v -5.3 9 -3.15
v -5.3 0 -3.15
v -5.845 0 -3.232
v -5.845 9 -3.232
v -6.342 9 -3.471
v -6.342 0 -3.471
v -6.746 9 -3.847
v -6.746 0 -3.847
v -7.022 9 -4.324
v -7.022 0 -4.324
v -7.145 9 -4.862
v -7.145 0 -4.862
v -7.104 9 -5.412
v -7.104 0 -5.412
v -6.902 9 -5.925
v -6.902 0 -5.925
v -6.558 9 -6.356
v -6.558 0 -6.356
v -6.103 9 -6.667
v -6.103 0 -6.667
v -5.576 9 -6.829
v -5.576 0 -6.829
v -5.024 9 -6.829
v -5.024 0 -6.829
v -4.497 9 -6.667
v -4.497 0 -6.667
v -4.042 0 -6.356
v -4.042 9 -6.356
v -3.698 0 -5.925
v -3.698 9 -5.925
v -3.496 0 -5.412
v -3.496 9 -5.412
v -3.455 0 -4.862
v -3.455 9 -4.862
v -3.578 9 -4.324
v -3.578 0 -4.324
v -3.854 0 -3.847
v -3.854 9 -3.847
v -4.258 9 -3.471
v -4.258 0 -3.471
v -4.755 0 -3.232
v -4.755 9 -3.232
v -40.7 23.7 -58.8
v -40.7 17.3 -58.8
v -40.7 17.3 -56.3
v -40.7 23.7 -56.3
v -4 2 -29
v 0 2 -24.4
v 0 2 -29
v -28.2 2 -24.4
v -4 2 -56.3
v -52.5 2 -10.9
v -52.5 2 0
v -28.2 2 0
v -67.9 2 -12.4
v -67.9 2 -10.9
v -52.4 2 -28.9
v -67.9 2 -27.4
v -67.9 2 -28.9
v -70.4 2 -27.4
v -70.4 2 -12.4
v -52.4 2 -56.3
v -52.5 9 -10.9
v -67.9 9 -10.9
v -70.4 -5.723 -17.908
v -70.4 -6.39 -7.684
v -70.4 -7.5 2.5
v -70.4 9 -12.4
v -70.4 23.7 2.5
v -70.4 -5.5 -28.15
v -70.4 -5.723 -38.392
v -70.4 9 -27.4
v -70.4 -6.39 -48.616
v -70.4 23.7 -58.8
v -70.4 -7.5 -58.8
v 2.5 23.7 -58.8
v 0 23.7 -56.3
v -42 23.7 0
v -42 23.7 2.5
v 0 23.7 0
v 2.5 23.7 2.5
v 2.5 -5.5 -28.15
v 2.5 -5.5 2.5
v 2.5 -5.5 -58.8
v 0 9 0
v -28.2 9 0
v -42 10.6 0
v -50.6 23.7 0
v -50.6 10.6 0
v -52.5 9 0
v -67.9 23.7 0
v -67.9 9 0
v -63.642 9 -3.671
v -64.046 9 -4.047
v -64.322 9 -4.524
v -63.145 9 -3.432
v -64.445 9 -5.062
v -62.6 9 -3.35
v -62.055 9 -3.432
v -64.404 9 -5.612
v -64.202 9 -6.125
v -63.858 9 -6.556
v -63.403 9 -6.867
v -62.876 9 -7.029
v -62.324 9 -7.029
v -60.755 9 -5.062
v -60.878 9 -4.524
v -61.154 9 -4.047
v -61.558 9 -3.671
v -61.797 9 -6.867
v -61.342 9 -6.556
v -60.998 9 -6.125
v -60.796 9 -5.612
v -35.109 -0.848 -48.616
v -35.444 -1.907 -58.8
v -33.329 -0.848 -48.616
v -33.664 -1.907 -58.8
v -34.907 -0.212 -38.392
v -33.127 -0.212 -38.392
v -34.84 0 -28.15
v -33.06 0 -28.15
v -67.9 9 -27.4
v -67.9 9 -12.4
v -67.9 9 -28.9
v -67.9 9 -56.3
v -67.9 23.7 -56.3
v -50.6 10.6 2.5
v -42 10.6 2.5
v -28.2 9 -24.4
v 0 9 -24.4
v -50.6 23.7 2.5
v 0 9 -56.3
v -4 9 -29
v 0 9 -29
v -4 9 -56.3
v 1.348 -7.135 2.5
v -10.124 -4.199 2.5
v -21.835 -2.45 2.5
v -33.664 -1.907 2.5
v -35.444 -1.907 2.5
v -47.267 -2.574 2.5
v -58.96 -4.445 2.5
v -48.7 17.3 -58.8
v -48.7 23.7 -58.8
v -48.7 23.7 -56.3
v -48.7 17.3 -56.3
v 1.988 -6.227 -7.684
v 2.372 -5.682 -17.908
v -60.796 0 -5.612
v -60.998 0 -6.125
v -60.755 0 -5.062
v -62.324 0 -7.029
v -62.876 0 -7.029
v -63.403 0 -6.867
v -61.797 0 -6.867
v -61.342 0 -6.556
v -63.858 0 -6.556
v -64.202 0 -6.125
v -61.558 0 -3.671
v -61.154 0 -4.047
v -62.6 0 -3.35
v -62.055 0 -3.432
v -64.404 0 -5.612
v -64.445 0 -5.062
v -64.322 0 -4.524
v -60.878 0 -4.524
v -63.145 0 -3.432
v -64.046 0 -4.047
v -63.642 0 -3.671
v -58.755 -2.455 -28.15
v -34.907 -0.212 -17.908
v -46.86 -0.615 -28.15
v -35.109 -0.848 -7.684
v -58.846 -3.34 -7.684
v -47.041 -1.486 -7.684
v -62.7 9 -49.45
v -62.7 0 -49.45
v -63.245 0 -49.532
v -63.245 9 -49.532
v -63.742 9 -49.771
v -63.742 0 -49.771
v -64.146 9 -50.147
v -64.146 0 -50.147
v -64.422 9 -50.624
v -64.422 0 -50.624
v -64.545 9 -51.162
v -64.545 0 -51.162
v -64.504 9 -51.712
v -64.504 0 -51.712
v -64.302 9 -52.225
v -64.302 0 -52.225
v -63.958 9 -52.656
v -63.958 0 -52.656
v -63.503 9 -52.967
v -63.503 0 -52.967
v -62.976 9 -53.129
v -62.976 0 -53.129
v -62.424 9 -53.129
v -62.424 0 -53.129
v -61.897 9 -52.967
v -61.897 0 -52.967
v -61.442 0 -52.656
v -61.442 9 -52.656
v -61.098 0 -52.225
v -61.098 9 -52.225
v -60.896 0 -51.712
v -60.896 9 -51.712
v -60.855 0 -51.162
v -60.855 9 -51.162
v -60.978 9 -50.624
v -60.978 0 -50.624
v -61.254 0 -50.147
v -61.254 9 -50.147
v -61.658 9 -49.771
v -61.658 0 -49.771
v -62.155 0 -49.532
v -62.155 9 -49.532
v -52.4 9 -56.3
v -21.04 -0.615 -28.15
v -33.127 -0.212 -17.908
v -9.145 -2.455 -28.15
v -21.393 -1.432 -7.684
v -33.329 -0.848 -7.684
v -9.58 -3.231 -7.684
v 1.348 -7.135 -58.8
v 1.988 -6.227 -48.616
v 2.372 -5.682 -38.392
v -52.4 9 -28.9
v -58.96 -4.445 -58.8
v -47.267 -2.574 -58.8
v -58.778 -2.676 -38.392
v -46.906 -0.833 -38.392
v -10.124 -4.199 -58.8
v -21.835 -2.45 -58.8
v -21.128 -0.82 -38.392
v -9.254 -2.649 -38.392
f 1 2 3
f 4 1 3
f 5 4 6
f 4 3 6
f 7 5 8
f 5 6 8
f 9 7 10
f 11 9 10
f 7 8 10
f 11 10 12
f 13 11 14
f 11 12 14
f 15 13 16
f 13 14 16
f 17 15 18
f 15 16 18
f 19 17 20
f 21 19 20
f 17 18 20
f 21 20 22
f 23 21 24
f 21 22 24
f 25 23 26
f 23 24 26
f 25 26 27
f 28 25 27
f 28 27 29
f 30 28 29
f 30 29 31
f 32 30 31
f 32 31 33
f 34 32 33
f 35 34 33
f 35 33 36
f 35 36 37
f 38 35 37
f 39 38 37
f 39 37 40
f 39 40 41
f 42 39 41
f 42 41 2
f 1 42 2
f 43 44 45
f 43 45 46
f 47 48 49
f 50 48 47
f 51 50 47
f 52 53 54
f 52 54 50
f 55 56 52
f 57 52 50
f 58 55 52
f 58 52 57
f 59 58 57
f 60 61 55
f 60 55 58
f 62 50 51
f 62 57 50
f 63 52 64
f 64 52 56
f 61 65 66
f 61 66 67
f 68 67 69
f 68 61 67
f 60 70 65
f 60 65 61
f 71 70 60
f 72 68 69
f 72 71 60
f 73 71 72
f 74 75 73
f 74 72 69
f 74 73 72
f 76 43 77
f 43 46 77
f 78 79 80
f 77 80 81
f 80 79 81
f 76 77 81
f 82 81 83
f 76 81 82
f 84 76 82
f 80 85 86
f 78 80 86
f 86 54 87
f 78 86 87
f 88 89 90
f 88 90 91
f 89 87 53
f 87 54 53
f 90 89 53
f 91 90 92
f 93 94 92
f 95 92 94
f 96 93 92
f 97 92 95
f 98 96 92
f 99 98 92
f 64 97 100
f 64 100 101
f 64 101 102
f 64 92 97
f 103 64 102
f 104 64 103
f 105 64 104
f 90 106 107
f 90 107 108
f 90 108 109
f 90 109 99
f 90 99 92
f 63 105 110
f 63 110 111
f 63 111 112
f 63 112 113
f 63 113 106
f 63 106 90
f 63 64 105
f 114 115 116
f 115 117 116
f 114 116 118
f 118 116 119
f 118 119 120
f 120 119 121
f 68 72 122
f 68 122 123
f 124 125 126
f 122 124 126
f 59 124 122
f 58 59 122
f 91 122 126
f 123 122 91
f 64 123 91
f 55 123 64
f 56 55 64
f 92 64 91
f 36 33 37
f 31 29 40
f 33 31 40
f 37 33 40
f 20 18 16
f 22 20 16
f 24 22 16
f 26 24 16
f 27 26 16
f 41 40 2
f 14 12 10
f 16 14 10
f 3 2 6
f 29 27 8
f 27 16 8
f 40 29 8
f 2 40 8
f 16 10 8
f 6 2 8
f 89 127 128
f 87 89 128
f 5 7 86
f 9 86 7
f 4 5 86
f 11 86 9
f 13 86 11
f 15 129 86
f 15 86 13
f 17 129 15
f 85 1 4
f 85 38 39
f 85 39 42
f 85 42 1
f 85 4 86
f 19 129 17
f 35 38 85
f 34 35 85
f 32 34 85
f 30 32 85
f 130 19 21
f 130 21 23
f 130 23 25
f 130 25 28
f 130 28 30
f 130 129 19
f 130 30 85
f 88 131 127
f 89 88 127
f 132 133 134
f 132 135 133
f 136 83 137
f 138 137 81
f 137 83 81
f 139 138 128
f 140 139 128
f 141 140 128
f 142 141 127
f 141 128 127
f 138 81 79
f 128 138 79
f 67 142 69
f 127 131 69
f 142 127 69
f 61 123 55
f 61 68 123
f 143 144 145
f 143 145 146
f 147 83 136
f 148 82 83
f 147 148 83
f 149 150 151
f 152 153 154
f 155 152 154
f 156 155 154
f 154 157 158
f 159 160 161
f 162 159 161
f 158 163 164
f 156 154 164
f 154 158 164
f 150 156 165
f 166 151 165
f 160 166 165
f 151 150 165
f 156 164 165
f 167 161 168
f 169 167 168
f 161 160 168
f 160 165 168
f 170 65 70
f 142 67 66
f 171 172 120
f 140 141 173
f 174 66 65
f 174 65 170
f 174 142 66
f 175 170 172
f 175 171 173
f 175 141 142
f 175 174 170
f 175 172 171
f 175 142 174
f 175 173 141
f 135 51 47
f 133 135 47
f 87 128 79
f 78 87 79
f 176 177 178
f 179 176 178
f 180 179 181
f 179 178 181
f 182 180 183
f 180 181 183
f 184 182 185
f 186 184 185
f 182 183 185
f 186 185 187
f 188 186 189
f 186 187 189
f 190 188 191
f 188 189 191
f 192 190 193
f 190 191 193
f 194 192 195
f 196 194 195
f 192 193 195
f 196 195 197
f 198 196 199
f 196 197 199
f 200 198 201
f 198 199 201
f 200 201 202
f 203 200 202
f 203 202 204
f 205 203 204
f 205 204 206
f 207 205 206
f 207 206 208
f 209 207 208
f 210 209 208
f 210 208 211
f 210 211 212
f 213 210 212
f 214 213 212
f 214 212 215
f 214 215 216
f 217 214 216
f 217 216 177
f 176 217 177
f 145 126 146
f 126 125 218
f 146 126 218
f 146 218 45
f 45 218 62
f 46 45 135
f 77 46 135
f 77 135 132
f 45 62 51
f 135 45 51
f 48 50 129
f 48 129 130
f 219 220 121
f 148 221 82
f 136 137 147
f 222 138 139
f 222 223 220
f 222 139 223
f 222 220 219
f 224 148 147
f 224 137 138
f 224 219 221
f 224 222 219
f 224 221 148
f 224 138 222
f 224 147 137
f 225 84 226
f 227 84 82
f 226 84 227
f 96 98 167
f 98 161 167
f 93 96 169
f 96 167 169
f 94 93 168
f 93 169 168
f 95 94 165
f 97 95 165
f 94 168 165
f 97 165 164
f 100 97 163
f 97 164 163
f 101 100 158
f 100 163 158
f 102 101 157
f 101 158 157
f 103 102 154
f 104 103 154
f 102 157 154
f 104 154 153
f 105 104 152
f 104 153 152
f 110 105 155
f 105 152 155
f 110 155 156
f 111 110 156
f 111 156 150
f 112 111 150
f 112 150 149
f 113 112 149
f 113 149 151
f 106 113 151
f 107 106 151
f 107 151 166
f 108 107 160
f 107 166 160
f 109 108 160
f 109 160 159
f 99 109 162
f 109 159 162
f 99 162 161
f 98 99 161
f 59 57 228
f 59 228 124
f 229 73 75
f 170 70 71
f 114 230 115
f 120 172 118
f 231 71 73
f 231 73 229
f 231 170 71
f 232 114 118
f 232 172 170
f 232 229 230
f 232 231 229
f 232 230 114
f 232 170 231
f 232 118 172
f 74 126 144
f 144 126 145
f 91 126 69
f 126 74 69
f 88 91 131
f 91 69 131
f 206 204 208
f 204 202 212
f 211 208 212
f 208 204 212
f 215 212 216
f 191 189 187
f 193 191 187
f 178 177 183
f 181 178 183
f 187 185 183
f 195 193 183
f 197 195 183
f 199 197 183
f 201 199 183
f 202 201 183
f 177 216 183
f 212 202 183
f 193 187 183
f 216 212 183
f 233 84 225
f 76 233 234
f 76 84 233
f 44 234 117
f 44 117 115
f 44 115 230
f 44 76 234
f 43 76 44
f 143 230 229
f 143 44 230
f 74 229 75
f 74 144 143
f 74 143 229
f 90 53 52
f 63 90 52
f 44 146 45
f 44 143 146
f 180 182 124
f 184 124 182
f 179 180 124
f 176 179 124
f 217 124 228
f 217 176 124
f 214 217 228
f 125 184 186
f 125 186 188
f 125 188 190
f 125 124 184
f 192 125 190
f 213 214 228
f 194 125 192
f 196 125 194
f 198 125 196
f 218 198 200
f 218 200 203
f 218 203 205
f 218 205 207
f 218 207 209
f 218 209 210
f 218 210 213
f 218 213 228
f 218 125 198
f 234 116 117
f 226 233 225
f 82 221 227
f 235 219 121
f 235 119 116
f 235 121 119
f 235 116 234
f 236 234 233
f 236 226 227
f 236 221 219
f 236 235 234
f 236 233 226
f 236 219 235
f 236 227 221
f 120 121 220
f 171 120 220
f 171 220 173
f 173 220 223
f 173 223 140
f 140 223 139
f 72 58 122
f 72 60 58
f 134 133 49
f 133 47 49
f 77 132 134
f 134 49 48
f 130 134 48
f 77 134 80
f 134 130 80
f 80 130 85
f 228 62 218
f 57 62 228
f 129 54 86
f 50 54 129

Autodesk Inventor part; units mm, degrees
ref_plane "YZ Plane" through (0, 0, 0) normal (1, 0, 0) x (0, 1, 0)
ref_plane "XZ Plane" through (0, 0, 0) normal (0, 1, 0) x (-1, 0, 0)
sketch "Sketch1" plane through (0, 0, 0) normal (0, 1, 0) x (-1, 0, 0)
  line L0 (0, 0) -> (67.9, 0)
  line L1 (67.9, 0) -> (67.9, -56.3)
  line L2 (67.9, -56.3) -> (0, -56.3)
  line L3 (0, -56.3) -> (0, 0)
  dimension "d4" = 67.9
  dimension "d5" = 56.3
extrude "Extrusion1" add sketch "Sketch1" along normal blind 2
sketch "Sketch4" plane through (0, 0, 0) normal (0, -1, 0) x (1, 0, 0)
  line L0 (2.5, 2.5) -> (-70.4, 2.5)
  line L1 (-70.4, 2.5) -> (-70.4, -58.8)
  line L2 (-70.4, -58.8) -> (2.5, -58.8)
  line L3 (2.5, -58.8) -> (2.5, 2.5)
  line L4 (0, -56.3) -> (0, 0) projected
  line L5 (0, 0) -> (-67.9, 0) projected
  line L6 (-67.9, -56.3) -> (0, -56.3) projected
  line L7 (-67.9, -56.3) -> (-67.9, 0) projected
  line L8 (0, 0) -> (-67.9, 0)
  line L9 (-67.9, 0) -> (-67.9, -56.3)
  line L10 (-67.9, -56.3) -> (0, -56.3)
  line L11 (0, -56.3) -> (0, 0)
  point P0 (-67.7799, -40.4535)
  point P1 (-67.7799, -17.6706)
  dimension "d35" = 2.5
  dimension "d36" = 2.5
  dimension "d37" = 2.5
  dimension "d38" = 2.5
extrude "Extrusion3" add sketch "Sketch4" against normal blind 23.7
sketch "Sketch5" plane through (2.5, 0, -58.8) normal (0, 0, -1) x (-1, 0, 0)
  line L0 (0, 0) -> (0, -5.5)
  line L1 (0, 0) -> (35.56, 0)
  line L2 (0, 0) -> (72.9, 0) projected
  arc A0 (35.56, 0) -> (0, -5.5) centre (35.56, -117.7058) ccw
  line L3 (72.9, 0) -> (0, 0) projected
  point P0 (2.5, 0)
  dimension "d41" = 5.5
  dimension "d42" = 35.56
extrude "Extrusion4" add sketch "Sketch5" against normal up to surface (61.3 mm away)
ref_plane "Work Plane1" through (-33.95, 23.7, 2.5) normal (1, 0, 0) x (0, 0, -1)
mirror "Mirror1" about plane through (-33.95, 23.7, 2.5) normal (1, 0, 0) of "Extrusion4"
sketch "Sketch11" plane through (0, 2, 0) normal (0, 1, 0) x (1, 0, 0)
  line L0 (-67.9, 0) -> (0, 0) projected
  line L1 (0, 0) -> (0, 56.3) projected
  line L2 (0, 56.3) -> (-67.9, 56.3) projected
  line L3 (-67.9, 56.3) -> (-67.9, 0) projected
  line L4 (-67.9, 0) -> (-52.5, 0)
  line L5 (-52.5, 0) -> (-52.5, 10.9)
  line L6 (-52.5, 10.9) -> (-67.9, 10.9)
  line L7 (-67.9, 10.9) -> (-67.9, 0)
  line L8 (-67.9, 56.3) -> (-52.4, 56.3)
  line L9 (-52.4, 56.3) -> (-52.4, 28.9)
  line L10 (-52.4, 28.9) -> (-67.9, 28.9)
  line L11 (-67.9, 28.9) -> (-67.9, 56.3)
  line L12 (0, 0) -> (-28.2, 0)
  line L13 (-28.2, 0) -> (-28.2, 24.4)
  line L14 (-28.2, 24.4) -> (0, 24.4)
  line L15 (0, 24.4) -> (0, 0)
  line L16 (0, 0) -> (0, 56.3) projected
  line L17 (0, 56.3) -> (-4, 56.3)
  line L18 (-4, 56.3) -> (-4, 29)
  line L19 (-4, 29) -> (0, 29)
  line L20 (0, 29) -> (0, 56.3)
  dimension "d89" = 15.4
  dimension "d90" = 10.9
  dimension "d91" = 15.5
  dimension "d92" = 27.4
  dimension "d93" = 28.2
  dimension "d94" = 24.4
  dimension "d95" = 4
  dimension "d96" = 27.3
extrude "Extrusion7" add sketch "Sketch11" along normal blind 7 contours L3 L6 L5 L0 | L13 L14 L1 L0 | L3 L2 L9 L10 | L19 L18 L2 L1
sketch "Sketch12" plane through (0, 9, 0) normal (0, 1, 0) x (1, 0, 0)
  line L0 (0, 0) -> (-67.9, 0) projected
  line L1 (-67.9, 0) -> (-67.9, 56.3) projected
  line L2 (-67.9, 56.3) -> (0, 56.3) projected
  line L3 (0, 56.3) -> (0, 0) projected
  point P0 (-62.6, 5.2)
  point P1 (-5.3, 5)
  point P2 (-62.7, 51.3)
  dimension "d99" = 5.2
  dimension "d100" = 5.3
  dimension "d101" = 5.2
  dimension "d102" = 5
  dimension "d103" = 5
  dimension "d104" = 5.3
hole "Hole6" at (-62.6, 9, -5.2) at (-5.3, 9, -5) at (-62.7, 9, -51.3) direction (0, -1, 0) diameter 3.7 depth 9
sketch "Sketch13" plane through (-70.4, 0, 2.5) normal (0, 0, 1) x (1, 0, 0)
  line L0 (17.9, 9) -> (2.5, 9) projected
  line L1 (70.4, 9) -> (42.2, 9) projected
  line L2 (19.8, 10.6) -> (28.4, 10.6)
  line L3 (28.4, 10.6) -> (28.4, 23.7)
  line L4 (28.4, 23.7) -> (19.8, 23.7)
  line L5 (19.8, 23.7) -> (19.8, 10.6)
  line L6 (0, 23.7) -> (72.9, 23.7) projected
  point P0 (70.4, 0)
  point P1 (2.5, 23.7)
  dimension "d112" = 1.6
  dimension "d113" = 17.3
  dimension "d114" = 8.6
extrude "Extrusion8" cut sketch "Sketch13" against normal up to surface (2.5 mm away)
sketch "Sketch14" plane through (-70.4, 0, -58.8) normal (-1, 0, 0) x (0, 0, 1)
  line L0 (5.65, 9) -> (9.35, 9) projected
  line L1 (29.9, 9) -> (2.5, 9) projected
  line L2 (29.9, 9) -> (2.5, 9) projected
  line L3 (58.8, 9) -> (47.9, 9) projected
  line L4 (51.75, 9) -> (55.45, 9) projected
  line L5 (58.8, 9) -> (47.9, 9) projected
  line L6 (58.8, 9) -> (47.9, 9) projected
  line L7 (31.4, 9) -> (46.4, 9)
  line L8 (46.4, 9) -> (46.4, 2)
  line L9 (46.4, 2) -> (31.4, 2)
  line L10 (31.4, 2) -> (31.4, 9)
  point P0 (58.8, 0)
  dimension "d118" = 12.4
  dimension "d119" = 15
  dimension "d120" = 7
extrude "Extrusion9" cut sketch "Sketch14" against normal up to surface (2.5 mm away)
sketch "Sketch15" plane through (2.5, 0, -58.8) normal (0, 0, -1) x (-1, 0, 0)
  line L0 (63.35, 9) -> (67.05, 9) projected
  line L1 (70.4, 9) -> (54.9, 9) projected
  line L2 (70.4, 9) -> (54.9, 9) projected
  line L3 (6.5, 9) -> (2.5, 9) projected
  line L4 (6.5, 9) -> (2.5, 9) projected
  line L5 (51.2, 23.7) -> (51.2, 17.3)
  line L6 (51.2, 17.3) -> (43.2, 17.3)
  line L7 (43.2, 17.3) -> (43.2, 23.7)
  line L8 (37.34, 0) -> (35.56, 0) projected
  line L9 (72.9, 23.7) -> (72.9, -5.5) projected
  line L10 (0, 23.7) -> (72.9, 23.7) projected
  line L11 (0, 23.7) -> (0, -5.5) projected
  arc A0 (35.56, 0) -> (0, -5.5) centre (35.56, -117.7058) ccw projected
  arc A1 (72.9, -5.5) -> (37.34, 0) centre (37.34, -117.7058) ccw projected
  line L12 (54.9, 2) -> (70.4, 2) projected
  line L13 (70.4, 2) -> (55, 2) projected
  line L14 (55, 2) -> (30.7, 2) projected
  line L15 (30.7, 2) -> (2.5, 2) projected
  line L16 (2.5, 2) -> (6.5, 2) projected
  line L17 (6.5, 2) -> (54.9, 2) projected
  line L18 (72.9, 2) -> (70.4, 2) projected
  line L19 (72.9, 2) -> (70.4, 2) projected
  point P0 (2.5, 0)
  dimension "d124" = 40.7
  dimension "d126" = 8.3
  dimension "d127" = 8
extrude "Extrusion10" cut sketch "Sketch15" against normal up to surface (2.5 mm away) contours L5 L6 L7 L10
sketch "Sketch16" plane through (-70.4, 23.7, -58.8) normal (-1, 0, 0) x (0, 0, 1)
  line L0 (0, -23.7) -> (61.3, -23.7) projected
  line L1 (0, -29.2) -> (0, -23.7) projected
  line L2 (61.3, 0) -> (61.3, -29.2) projected
  line L3 (0, -29.2) -> (61.3, -29.2) projected
  arc A0 (61.3, -31.2) -> (0, -31.2) centre (30.65, -265.0556) ccw
  line L4 (0, -29.2) -> (61.3, -29.2) projected
  line L5 (0, -31.2) -> (0, -29.2)
  line L6 (61.3, -29.2) -> (61.3, -31.2)
  point P0 (58.8, -23.7)
  point P1 (30.65, -26.2)
  dimension "d134" = 2
  dimension "d136" = 2
sketch3d "3D Sketch1"
  arc A0 (-70.4, -5.5, -58.8) -> (-34.84, 0, -58.8) centre (-34.84, -117.7058, -58.8) ccw
  line L0 (-34.84, 0, -58.8) -> (-33.06, 0, -58.8)
  arc A1 (-33.06, 0, -58.8) -> (2.5, -5.5, -58.8) centre (-33.06, -117.7058, -58.8) ccw
sweep "Sweep1" add profiles "Sketch16" path "3D Sketch1" contours L3 A0 L5 | L6 A0 L3
properties part number "Base"
